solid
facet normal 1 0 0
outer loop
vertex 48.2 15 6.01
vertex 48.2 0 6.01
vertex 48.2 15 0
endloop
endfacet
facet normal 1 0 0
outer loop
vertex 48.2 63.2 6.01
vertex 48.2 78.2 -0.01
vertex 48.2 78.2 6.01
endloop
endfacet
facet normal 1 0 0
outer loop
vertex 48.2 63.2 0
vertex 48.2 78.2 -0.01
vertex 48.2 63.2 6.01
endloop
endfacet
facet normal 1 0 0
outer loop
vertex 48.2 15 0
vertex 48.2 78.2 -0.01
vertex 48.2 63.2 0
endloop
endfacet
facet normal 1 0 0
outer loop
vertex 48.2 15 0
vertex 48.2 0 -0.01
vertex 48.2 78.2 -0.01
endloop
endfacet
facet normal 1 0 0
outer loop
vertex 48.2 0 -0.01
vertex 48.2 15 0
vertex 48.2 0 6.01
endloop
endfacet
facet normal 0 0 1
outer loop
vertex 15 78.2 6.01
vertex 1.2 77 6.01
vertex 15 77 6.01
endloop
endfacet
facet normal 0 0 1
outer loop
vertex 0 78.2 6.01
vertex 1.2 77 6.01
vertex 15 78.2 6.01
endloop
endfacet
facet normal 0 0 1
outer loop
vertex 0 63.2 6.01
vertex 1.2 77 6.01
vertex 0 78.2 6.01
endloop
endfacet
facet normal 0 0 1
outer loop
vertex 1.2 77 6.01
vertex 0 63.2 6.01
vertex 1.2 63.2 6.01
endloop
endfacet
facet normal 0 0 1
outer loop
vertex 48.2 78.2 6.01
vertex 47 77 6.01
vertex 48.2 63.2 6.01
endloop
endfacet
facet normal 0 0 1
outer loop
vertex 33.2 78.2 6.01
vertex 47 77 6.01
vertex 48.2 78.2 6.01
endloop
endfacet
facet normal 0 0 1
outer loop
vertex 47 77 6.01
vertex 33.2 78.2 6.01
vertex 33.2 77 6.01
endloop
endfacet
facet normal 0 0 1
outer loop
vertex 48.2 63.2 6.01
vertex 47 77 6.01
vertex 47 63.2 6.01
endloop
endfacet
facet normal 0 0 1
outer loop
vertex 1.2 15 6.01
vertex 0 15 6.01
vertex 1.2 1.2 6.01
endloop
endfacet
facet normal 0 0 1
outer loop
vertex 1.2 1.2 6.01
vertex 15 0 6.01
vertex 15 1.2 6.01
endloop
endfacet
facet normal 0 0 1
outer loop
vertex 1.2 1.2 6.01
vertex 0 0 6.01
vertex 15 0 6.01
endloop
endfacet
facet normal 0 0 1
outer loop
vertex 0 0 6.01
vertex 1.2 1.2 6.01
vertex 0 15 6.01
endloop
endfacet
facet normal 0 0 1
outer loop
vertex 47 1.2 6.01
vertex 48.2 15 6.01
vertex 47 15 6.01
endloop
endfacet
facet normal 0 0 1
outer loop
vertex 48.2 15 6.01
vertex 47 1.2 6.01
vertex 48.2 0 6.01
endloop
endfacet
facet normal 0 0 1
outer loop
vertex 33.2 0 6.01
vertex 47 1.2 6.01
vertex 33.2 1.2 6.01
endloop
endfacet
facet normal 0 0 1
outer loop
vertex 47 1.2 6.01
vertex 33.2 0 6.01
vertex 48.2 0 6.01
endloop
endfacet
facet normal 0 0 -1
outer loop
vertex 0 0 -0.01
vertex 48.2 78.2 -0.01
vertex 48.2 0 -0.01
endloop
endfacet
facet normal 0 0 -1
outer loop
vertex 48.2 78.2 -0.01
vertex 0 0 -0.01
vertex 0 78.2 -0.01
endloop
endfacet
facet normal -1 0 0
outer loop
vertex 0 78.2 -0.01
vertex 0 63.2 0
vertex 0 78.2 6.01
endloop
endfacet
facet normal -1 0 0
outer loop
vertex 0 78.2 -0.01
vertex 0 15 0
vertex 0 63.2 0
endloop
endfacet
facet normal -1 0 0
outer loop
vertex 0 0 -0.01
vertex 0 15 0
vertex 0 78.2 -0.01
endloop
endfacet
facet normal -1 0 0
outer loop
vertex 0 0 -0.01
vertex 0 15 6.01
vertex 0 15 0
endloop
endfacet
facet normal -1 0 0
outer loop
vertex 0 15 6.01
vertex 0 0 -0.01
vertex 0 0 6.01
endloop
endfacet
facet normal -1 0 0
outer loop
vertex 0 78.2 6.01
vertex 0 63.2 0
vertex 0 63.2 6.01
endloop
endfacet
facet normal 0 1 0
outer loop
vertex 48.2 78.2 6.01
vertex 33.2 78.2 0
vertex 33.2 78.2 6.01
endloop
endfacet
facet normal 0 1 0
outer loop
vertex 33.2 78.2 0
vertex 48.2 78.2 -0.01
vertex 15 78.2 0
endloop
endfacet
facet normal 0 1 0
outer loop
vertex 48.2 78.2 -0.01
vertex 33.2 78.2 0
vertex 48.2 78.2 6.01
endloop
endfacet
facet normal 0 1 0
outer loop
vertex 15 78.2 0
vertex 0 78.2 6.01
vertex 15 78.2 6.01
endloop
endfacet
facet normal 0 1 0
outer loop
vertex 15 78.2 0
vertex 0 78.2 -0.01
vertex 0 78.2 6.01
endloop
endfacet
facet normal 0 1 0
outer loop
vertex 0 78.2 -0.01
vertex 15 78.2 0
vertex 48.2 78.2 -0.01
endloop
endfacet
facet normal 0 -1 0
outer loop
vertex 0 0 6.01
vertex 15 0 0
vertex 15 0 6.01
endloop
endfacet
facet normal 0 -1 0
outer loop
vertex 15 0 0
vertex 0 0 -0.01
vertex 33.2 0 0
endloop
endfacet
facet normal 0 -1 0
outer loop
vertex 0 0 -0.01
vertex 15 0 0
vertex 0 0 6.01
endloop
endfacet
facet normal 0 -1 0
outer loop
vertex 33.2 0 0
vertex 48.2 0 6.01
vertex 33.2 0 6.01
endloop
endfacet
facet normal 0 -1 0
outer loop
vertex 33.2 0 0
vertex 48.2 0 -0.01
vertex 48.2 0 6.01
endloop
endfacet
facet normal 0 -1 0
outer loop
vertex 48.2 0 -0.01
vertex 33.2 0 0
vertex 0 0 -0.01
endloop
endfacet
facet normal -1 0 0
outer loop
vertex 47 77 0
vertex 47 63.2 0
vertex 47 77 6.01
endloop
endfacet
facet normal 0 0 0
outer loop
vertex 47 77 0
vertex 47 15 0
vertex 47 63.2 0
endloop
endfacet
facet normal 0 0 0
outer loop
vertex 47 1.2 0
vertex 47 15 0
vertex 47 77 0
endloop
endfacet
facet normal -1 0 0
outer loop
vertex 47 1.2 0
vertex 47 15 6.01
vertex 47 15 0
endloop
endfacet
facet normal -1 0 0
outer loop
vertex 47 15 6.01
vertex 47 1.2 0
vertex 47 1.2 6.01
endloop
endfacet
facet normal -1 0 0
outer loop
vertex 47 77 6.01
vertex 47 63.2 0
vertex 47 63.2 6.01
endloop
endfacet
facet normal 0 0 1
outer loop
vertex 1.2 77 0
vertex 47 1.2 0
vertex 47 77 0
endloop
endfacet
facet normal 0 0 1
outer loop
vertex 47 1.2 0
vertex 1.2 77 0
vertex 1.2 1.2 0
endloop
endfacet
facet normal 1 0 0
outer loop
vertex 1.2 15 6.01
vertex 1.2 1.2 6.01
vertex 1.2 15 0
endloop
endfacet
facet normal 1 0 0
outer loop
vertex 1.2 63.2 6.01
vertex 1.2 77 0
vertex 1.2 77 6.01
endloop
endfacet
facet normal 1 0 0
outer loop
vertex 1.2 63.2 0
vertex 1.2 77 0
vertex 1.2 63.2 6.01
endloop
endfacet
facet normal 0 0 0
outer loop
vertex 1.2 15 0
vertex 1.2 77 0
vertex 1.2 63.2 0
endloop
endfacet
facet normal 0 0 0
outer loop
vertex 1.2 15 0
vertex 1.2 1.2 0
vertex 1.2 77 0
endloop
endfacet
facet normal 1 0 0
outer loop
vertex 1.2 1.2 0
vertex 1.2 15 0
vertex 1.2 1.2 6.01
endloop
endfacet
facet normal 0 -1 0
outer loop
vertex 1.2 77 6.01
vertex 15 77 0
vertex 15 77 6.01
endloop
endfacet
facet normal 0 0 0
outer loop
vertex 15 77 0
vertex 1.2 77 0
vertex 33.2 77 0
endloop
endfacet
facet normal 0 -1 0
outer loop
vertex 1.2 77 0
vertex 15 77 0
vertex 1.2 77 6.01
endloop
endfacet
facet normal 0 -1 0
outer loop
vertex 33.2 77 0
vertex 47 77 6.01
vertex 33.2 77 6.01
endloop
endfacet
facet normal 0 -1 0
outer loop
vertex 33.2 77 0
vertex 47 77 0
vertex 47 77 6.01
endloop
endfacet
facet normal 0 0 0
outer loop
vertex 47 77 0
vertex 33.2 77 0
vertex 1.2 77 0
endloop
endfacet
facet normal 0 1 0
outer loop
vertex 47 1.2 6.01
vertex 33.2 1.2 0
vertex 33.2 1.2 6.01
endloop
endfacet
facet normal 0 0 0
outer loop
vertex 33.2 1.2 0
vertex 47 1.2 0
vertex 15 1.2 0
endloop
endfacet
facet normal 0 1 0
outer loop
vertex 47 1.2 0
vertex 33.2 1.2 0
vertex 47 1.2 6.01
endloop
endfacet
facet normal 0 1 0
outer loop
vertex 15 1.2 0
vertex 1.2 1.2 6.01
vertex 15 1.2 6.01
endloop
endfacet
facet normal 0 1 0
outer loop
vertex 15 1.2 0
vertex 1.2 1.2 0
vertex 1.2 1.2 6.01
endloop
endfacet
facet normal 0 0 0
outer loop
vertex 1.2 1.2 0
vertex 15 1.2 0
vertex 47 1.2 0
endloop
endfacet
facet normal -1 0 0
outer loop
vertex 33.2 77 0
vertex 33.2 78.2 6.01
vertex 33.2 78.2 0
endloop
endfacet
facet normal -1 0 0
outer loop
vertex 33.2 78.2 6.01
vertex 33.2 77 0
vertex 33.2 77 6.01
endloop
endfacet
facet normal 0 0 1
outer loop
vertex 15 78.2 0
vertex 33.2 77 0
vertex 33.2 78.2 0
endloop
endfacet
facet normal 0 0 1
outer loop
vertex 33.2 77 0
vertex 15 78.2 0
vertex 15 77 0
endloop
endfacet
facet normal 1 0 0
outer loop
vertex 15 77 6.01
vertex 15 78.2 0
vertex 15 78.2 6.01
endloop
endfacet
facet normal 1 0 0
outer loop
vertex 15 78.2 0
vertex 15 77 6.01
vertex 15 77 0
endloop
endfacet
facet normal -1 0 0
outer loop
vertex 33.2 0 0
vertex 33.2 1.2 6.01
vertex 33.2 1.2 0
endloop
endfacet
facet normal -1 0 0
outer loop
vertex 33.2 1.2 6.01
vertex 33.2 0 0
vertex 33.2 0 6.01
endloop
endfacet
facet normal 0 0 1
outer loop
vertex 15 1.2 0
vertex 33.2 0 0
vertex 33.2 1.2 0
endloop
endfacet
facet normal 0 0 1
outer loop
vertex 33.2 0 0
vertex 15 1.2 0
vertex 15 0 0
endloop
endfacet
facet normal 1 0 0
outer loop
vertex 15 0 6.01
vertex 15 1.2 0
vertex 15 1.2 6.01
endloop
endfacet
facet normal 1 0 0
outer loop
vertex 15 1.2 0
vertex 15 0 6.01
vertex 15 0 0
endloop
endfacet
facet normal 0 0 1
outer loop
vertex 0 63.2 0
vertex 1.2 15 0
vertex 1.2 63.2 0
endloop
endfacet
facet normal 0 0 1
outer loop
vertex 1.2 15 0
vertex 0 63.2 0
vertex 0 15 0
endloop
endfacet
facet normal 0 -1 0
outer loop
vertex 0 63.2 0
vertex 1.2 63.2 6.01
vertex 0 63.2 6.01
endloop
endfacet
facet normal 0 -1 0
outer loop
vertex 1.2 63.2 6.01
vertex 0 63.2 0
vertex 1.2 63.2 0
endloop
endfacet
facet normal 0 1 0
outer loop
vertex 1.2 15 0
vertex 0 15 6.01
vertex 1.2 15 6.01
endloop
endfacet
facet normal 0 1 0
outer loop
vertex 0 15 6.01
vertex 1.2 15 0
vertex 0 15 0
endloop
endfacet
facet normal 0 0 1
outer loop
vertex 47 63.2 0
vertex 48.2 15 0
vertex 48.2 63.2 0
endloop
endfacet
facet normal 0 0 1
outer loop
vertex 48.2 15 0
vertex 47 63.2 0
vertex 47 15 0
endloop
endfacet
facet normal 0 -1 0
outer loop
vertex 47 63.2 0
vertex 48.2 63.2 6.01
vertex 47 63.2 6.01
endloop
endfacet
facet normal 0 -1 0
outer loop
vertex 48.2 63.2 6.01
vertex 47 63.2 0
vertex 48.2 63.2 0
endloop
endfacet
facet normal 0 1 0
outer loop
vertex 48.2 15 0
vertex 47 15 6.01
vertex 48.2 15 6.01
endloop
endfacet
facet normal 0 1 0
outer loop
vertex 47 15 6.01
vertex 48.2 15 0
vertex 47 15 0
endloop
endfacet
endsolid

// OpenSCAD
// file: ../Base/Rotation.scad
// Fischertechnik Box Foundation
// Geometry Helpers Rotation

include <PlacementOptions.scad>

// getRotatedSpace(space, rotation=NoRotation)
// Rotates the space dependent on the specified rotation

function getRotatedSpace(space, rotation=NoRotation) = [
    (rotation == Rotate90 || rotation == Rotate270) ? space.y : space.x,
    (rotation == Rotate90 || rotation == Rotate270) ? space.x : space.y
];

// Rotates the given space around the fixed left lower corner
// space = the space the children needs as width/depth list [width,depth]
// rotation = 0 Rotate0 degrees, 1 Rotate90 degrees, 2 Rotate180 degrees, 3 Rotate270 degrees (equivalent to -90)

module RotateFix(space, rotation=NoRotation) {
    dy = (rotation == Rotate0 || rotation == Rotate270) ? 0 :
        (rotation == Rotate90) ? space.x :
        space.y;
    dx = (rotation < Rotate180) ? 0 :
        (rotation == Rotate180) ? space.x :
        space.y;
    
    translate([dx, dy, 0])
        rotate([0, 0, rotations[rotation]])
            children();
}
// file: ../Base/Alignment.scad
// Fischertechnik Box Foundation
// Geometry Helpers Alignment

include <PlacementOptions.scad>

// getAlignedX(elementWidth, spaceWidth, align=AlignRight, offset=0)
// Gets the aligned X offset of an element with the given
// width in the given space.
// elementWidth = The width of the element to positon
// spaceWidth = The space where the element should be aligned
// align = 0 AlignLeft, 1 AlignCenter, 2 AlignRight
// offset = an optional offset from the aligned position. When
// aligned left or centered, then positive values are in X direction.
// When aligned right then positive values are in negative X direction.

function getAlignedX(elementWidth, spaceWidth, align=AlignRight, offset=0) =
    (align == AlignLeft) ?
        offset :
        ((align == AlignCenter) ?
        (spaceWidth - elementWidth)/2 + offset :
        spaceWidth - offset - elementWidth);

// getAlignedY(elementDepth, spaceDepth, align=AlignTop, offset=0)
// Gets the aligned Y offset of an element with the given
// depth in the given space.
// elementDepth = The depth of the element to positon
// spaceDepth = The space where the element should be aligned
// align = 0 AlignBottom, 1 AlignCenter, 2 AlignTop
// offset = an optional offset from the aligned position. When
// aligned bottom or centered, then positive values are in Y direction.
// When aligned top then positive values are in negative Y direction.

function getAlignedY(elementDepth, spaceDepth, align=AlignTop, offset=0) =
    (align == AlignBottom) ?
        offset :
        ((align == AlignCenter) ?
        (spaceDepth - elementDepth)/2 + offset :
        spaceDepth - offset - elementDepth);
// file: ../Base/Boxes.scad
// Fischertechnik Box Foundation
// Pre-designed Boxes

use <Constants.scad>

include <PlacementOptions.scad>

box190Width = 190;
box190Depth = 130;
box130Width = 130;
box130Depth = 95;

// Values are from an original ec3 box
topBottomDifference = 1.5;
outerHeight = 40;
innerHeight = 38.2;
baseThickness = outerHeight - innerHeight;
stackExcess = 5.7;
radius = 3.5;
wallThickness = 1.5;
tolerance = 0.2;
stackOffset = innerHeight - stackExcess;

boxUsageHeight = stackOffset;
boxWallThickness = wallThickness;
boxBaseThickness = baseThickness;
boxWebWidth = 3.0;

// getBoxWallThickness()
// Gets the wall thickness of a Fischertechnik Box
function getBoxWallThickness() = boxWallThickness;

// getBoxUsageHeight()
// Gets the usable height of a Fischertechnik box
function getBoxUsageHeight() = boxUsageHeight;

// getBoxInnerHeight()
// Gets the inner height of a Fischertechnik box, including the stack excess
function getBoxInnerHeight() = innerHeight;

// getBoxBaseThickness()
// Gets the thickness of the Fischertechnik box base.
function getBoxBaseThickness() = boxBaseThickness;

// getBoxWebWidth()
// Gets the width of a box web
function getBoxWebWidth() = boxWebWidth;

// getBox190Space()
// Gets the usable inner space of a Box 190 as an x/y-list
function getBox190Space() = [
    box190Width - 2*getBoxWallThickness() - topBottomDifference, 
    box190Depth - 2*getBoxWallThickness() - topBottomDifference ];

// RoundedCornerPlate(width, depth, height, radius)
// Creates a body plate with rounded corners for a box. Used
// also to create the complete box with the hull module.
// width = Width of the plate
// depth = depth of the plate 
// height = thickness of the plate
// radius = radius of the rounded corner
module RoundedCornerPlate(width, depth, height, radius) {
    translate([radius, radius])
    hull() {
        w = width-2*radius;
        d = depth-2*radius;
        cube([w, d, height]);
        cylinder(height, r=radius, $fn=getFragments());
        translate([w, 0])
            cylinder(height, r=radius, $fn=getFragments());
        translate([w, d])
            cylinder(height, r=radius, $fn=getFragments());
        translate([0, d])
            cylinder(height, r=radius, $fn=getFragments());
    }
}

// BoxBase(width, depth)
// Creates an empty stackable Fischertechnik compatible box
// width = Outer width of the box (190, 130, ...)
// depth = Outer depth of the box (130, 95, ...)

module BoxBase(width, depth, height=outerHeight) {    
    thinPlate = 0.01;

    innerHeight = height - baseThickness;    
    
    module Body(tolerance=tolerance) {
        hull() {
            // Bottom with tolerance to fit into the original boxes when stacked
            translate([-wallThickness+tolerance, -wallThickness+tolerance, -baseThickness])
                RoundedCornerPlate(width-topBottomDifference-2*tolerance, depth-topBottomDifference-2*tolerance, thinPlate, radius);
            
            // Top
            translate([-wallThickness-topBottomDifference/2, -wallThickness-topBottomDifference/2, innerHeight-thinPlate])
                RoundedCornerPlate(width, depth, thinPlate, radius);
         }
    }

    module Cutoff() {
        hull() {
            coWidth = width - 2*wallThickness;
            coDepth = depth - 2*wallThickness;
            
            // Bottom
            RoundedCornerPlate(coWidth-topBottomDifference, coDepth-topBottomDifference, thinPlate, radius);

            // Top
            translate([-topBottomDifference/2, -topBottomDifference/2, innerHeight+thinPlate]) 
                RoundedCornerPlate(coWidth, coDepth, thinPlate, radius);
        }
    }
    
    difference() {        
        Body();
        Cutoff();
        stackOffset = innerHeight - stackExcess;
        translate([0, 0, stackOffset + baseThickness])
            Body(tolerance=0);
    }
}

// Creates the Fischertechnik empty box 130x190 mm and places it at position 0,0
// 190x130 are the outer sizes, the inner space is slightly smaller. Use getBox190Space() to get the inner sizes.
// The box is positioned that the usable inner space is at the 0,0,0 position.

module Box190() {
    BoxBase(box190Width, box190Depth);
}

// Gets the usable inner space of a Box 130 as an x/y-list
function getBox130Space() = [
    box130Width - 2*getBoxWallThickness() - topBottomDifference, 
    box130Depth - 2*getBoxWallThickness() - topBottomDifference ];

// Creates the Fischertechnik empty box 95x130 mm and places it at position 0,0
// 190x130 are the outer sizes, the inner space is slightly smaller. Use getBox190Space() to get the inner sizes.
// The box is positioned that the usable inner space is at the 0,0,0 position.

module Box130() {
    BoxBase(box130Width, box130Depth);
}

// Creates a web at the specified box walls
// corner 0 = LowerLeft, 1 = UpperLeft, 2 = UpperRight, 3 = LowerRight
// side 0 = LeftOfCorner, 1 = RightOfCorner
// distance = Distance in mm from the corner
// boxSpace = inner width and depth of the box (default: Box 190)
// webWidth = length of the web (default is 3 mms)
// webThickness = thickness of the web (default is 1 mm)

module BoxWeb(corner, side, distance, boxSpace=getBox190Space(), webWidth=getBoxWebWidth(), webThickness=1.0) {
    sink = getBoxWallThickness()/2;

    width = (corner % 2 == 0) ? 
            (side == LeftOfCorner ? webWidth : webThickness) :
            (side == LeftOfCorner ? webThickness : webWidth);

    depth = (corner % 2 == 0) ? 
            (side == RightOfCorner ? webWidth : webThickness) :
            (side == RightOfCorner ? webThickness : webWidth);
    
    xDiff = corner == LowerLeft ? 
                (side == LeftOfCorner ? -sink : distance) :
            (corner == UpperLeft ?                
                (side == LeftOfCorner ? distance : -sink) :
            (corner == UpperRight ?
                (side == LeftOfCorner ? boxSpace.x-webWidth+sink : boxSpace.x-distance-webThickness) :
                (side == LeftOfCorner ? boxSpace.x-distance-webThickness: boxSpace.x-webWidth+sink)));

    yDiff = corner == LowerLeft ? 
                (side == RightOfCorner ? -sink : distance) :
            (corner == UpperLeft ?
                (side == RightOfCorner ? boxSpace.y-distance : boxSpace.y-webWidth+sink) :
            (corner == UpperRight ?
                (side == RightOfCorner ? boxSpace.y-webWidth+sink : boxSpace.y-distance) :
                (side == RightOfCorner ? distance : -sink)));
    
    translate([xDiff, yDiff, -getExcess()])
        cube([width, depth, boxUsageHeight + 2*getExcess()]);
}
// file: ../Base/Placement.scad
// Fischertechnik Box Foundation
// Geometry Helpers Placement

use <Constants.scad>
use <Alignment.scad>
use <Rotation.scad>
use <Boxes.scad>

include <PlacementOptions.scad>

// Place(x=0, y=0, elementSpace=[0,0], alignX=AlignLeft, alignY=AlignBottom, rotation=Rotate0, boxSpace=getBox190Space())
// Places the child at the specified position
// y = Y-Position. This is a relative position when an X aligment is specified.
// x = X-Position. This is a relative position when an Y aligment is specified.
// elementSpace = space of the element to be placed [x,y]
// alignX = -1=NoAlign, 0 AlignLeft, 1 AlignCenter, 3 AlignRight (elementSpace and boxSpace required!)
// alignY = -1=NoAlign, 2 AlignBottom, 1 AlignCenter, 4 AlignTop (elementSpace and boxSpace required!)
// rotation = 0 Rotate0 0 degrees, 1 Rotate90 90 degrees, 
// 2 Rotate180 180 degrees, 3 Rotate270 270 degrees (equivalent to -90)
// boxSpace = Inner space of the box where the placement occurs [x,y] - default is Box 190x130 inner space

module Place(x=0, y=0, elementSpace=[0,0], 
  alignX=AlignLeft, alignY=AlignBottom, 
  rotation=NoRotation, boxSpace=getBox190Space()) {

    module Position(x, y, space, rotation=Rotate0) {
        translate([x, y, 0])
            RotateFix(space, rotation)
                children();
    }

    space = getRotatedSpace(elementSpace, rotation);
    alignedX = getAlignedX(space.x, boxSpace.x, alignX, x);
    alignedY = getAlignedY(space.y, boxSpace.y, alignY, y);
    Position(alignedX, alignedY, elementSpace, rotation)
        children();
}

// Center(space=getBox130Space(), elementSpace=[0,0])
// space = Space where the children is centered. For cylinder use centered=true and no elementSpace.
// elementSpace = space of the element to be centered [x,y]

module Center(space=getBox190Space(), elementSpace=[0,0]) {
    Place(elementSpace=elementSpace, boxSpace=space, alignX=AlignCenter, alignY=AlignCenter)
        children();
}

// CenterHorizontal(width=0, y=0, offset=0, space=getBox130Space())
// width = Width of the element to be placed.
// y = Y position of the element
// offset = Offset from the center position (negative will be left of the center)
// space = Space where the element is placed

module CenterHorizontal(width=0, y=0, offset=0, space=getBox190Space()) {
    Place(x=offset, y=y, elementSpace=[width, 0], boxSpace=space, alignX=AlignCenter)
        children(0);
}

// CenterVertical(depth=0, x=0, offset=0, space=getBox130Space())
// depth = Depth of the element to be placed.
// x = X position of the element
// offset = Offset from the center position (negative will be down of the center)
// space = Space where the element is placed

module CenterVertical(depth=0, x=0, offset=0, space=getBox190Space()) {
    Place(x=x, y=offset, elementSpace=[0, depth], boxSpace=space, alignY=AlignCenter)
        children(0);
}

// getIsVertical(align)
// True if the specified alignment needs a vertical orientation for a divider (AlignRight, AlignLeft)

function getIsVertical(align) = (align == AlignRight || align == AlignLeft);

// getIsHorizontal(align)
// True if the specified alignment needs a horizontal orientation for a divider (AlignTop, AlignBottom)

function getIsHorizontal(align) = (align == AlignTop || align == AlignBottom);
// file: ../Base/PlacementOptions.scad
// Fischertechnik Box Foundation
// Placement Options

// Alignment
NoAlign = 0;
AlignLeft = 1;
AlignBottom = 2;
AlignCenter = 3;
AlignRight = 4;
AlignTop = 5;

// Element rotation degree steps
rotations = [0, -90, -180, -270];

// Rotation
NoRotation = 0;
Rotate0 = 0;
Rotate90 = 1;
Rotate180 = 2;
Rotate270 = 3;

// Docking (seen from above)
NoDock = -1;
DockLeft = 0;
DockTop = 1;
DockRight = 2;
DockCorner = 2;
DockBottom = 3;

// Web corners
LowerLeft = 0;
UpperLeft = 1;
UpperRight = 2;
LowerRight = 3;

// Web position relative to corner
LeftOfCorner = 0;
RightOfCorner = 1;
// file: ../Base/Constants.scad
// Fischertechnik Box Foundation
// Constants

// Constant values necessary for multiple elements

// Base constants
dividerThickness = 1.2;
excess = 0.01;
fragments = 90;
tolerance = 0.8;

// Gets the thickness of a divider 
function getDividerThickness() = dividerThickness;

// Gets the excess that is used to merge walls into each other
function getExcess() = excess;

// Gets amount of fragments of a cylinder
function getFragments() = fragments;

// Gets the inner tolerance of a frame to each side
function getTolerance() = tolerance;


// Fischertechnik specific constants
axisDiameter = 4;
axisBottomDiameter = axisDiameter + 1;
axisTolerance = 0.2;

// Gets axis diameter of Fischertechnik axis
function getAxisDiameter() = axisDiameter;

// Gets axis diameter tolerance (subtracted for element axis)
function getAxisTolerance() = axisTolerance;

// Gets the axis diameter for standing axis
function getStandAxisDiameter() = getAxisDiameter() - getAxisTolerance();

// Gets axis bottom diameter for thicker part at the bottom
function getAxisBottomDiameter() = axisBottomDiameter;

standardEdgeDistance = 2.5;
standardWebDistance = 11.5;
standardCornerLength = 15;

// gets the standard distance to the wall of the box for dockable frames with webs
function getStandardEdgeDistance() = standardEdgeDistance;

// gets the standard distance of each web to the corner of the dockable frame
function getStandardWebDistance() = standardWebDistance;

// gets the standard length of the corner walls of a dockable frame
function getStandardCornerLength() = standardCornerLength;

tubeWallFactor = 0.8;

// gets the wall thickness of a tube.
function getTubeWallThickness() = tubeWallFactor * getDividerThickness();

smallPartsFrameHeight = 20;

// gets the frame height for docked small parts boxes.
function getSmallPartsFrameHeight() = smallPartsFrameHeight;

hubRingDiameter = 19.5;
hubRingLevelDiameter = 21;

// gets the diameter of a tube matching the inner ring of a wheel
function getHubRingDiameter() = hubRingDiameter;

// gets the diameter of a hub tube with a thicker diameter
function getHubRingLevelDiameter() = hubRingLevelDiameter;
// main file
// Fischertechnik Box Library
// Frame for Electronic Blocks ("Silberlinge")
// 36391,36392,36393,36394,36479,36480,36481,36482,36483

use <../Base/Constants.scad>
use <../ModelBase/Simple.scad>
use <../ModelBase/Complex.scad>

include <../Base/PlacementOptions.scad>

/* [Element Parameters] */
alignX = 0;   // [0:NoAlign, 1:AlignLeft, 4:AlignRight]
alignY = 0;   // [0:NoAlign, 2:AlignBottom, 5:AlignTop]

/* [Hidden] */
width = 45;
depth = 75;
height = 6;

// getFrameElectronicBlockSpace(alignX, alignY)
// alignX 0=NoAlign 1=AlignLeft 4=AlignRight 
// alignY 0=AlignNo 2=AlignBottom 5=AlignTop
// Gets the space the frame for an electronic block needs as width and depth(.x and .y as a list). 

function getFrameElectronicBlockSpace(alignX=NoAlign, alignY=NoAlign) = 
    getDockableEdgedFrameSpace([width, depth, height], alignX, alignY);

// FrameElectronicBlock(alignX, alignY)
// Frame for electronic block.
// alignX 0=NoAlign 1=AlignLeft 4=AlignRight 
// alignY 0=AlignNo 2=AlignBottom 5=AlignTop

module FrameElectronicBlock(alignX=NoAlign, alignY=NoAlign) {
    DockableEdgedFrame([width, depth, height], alignX, alignY);
}

// Test
color("lightgray") {
    FrameElectronicBlock(alignX, alignY);
}
